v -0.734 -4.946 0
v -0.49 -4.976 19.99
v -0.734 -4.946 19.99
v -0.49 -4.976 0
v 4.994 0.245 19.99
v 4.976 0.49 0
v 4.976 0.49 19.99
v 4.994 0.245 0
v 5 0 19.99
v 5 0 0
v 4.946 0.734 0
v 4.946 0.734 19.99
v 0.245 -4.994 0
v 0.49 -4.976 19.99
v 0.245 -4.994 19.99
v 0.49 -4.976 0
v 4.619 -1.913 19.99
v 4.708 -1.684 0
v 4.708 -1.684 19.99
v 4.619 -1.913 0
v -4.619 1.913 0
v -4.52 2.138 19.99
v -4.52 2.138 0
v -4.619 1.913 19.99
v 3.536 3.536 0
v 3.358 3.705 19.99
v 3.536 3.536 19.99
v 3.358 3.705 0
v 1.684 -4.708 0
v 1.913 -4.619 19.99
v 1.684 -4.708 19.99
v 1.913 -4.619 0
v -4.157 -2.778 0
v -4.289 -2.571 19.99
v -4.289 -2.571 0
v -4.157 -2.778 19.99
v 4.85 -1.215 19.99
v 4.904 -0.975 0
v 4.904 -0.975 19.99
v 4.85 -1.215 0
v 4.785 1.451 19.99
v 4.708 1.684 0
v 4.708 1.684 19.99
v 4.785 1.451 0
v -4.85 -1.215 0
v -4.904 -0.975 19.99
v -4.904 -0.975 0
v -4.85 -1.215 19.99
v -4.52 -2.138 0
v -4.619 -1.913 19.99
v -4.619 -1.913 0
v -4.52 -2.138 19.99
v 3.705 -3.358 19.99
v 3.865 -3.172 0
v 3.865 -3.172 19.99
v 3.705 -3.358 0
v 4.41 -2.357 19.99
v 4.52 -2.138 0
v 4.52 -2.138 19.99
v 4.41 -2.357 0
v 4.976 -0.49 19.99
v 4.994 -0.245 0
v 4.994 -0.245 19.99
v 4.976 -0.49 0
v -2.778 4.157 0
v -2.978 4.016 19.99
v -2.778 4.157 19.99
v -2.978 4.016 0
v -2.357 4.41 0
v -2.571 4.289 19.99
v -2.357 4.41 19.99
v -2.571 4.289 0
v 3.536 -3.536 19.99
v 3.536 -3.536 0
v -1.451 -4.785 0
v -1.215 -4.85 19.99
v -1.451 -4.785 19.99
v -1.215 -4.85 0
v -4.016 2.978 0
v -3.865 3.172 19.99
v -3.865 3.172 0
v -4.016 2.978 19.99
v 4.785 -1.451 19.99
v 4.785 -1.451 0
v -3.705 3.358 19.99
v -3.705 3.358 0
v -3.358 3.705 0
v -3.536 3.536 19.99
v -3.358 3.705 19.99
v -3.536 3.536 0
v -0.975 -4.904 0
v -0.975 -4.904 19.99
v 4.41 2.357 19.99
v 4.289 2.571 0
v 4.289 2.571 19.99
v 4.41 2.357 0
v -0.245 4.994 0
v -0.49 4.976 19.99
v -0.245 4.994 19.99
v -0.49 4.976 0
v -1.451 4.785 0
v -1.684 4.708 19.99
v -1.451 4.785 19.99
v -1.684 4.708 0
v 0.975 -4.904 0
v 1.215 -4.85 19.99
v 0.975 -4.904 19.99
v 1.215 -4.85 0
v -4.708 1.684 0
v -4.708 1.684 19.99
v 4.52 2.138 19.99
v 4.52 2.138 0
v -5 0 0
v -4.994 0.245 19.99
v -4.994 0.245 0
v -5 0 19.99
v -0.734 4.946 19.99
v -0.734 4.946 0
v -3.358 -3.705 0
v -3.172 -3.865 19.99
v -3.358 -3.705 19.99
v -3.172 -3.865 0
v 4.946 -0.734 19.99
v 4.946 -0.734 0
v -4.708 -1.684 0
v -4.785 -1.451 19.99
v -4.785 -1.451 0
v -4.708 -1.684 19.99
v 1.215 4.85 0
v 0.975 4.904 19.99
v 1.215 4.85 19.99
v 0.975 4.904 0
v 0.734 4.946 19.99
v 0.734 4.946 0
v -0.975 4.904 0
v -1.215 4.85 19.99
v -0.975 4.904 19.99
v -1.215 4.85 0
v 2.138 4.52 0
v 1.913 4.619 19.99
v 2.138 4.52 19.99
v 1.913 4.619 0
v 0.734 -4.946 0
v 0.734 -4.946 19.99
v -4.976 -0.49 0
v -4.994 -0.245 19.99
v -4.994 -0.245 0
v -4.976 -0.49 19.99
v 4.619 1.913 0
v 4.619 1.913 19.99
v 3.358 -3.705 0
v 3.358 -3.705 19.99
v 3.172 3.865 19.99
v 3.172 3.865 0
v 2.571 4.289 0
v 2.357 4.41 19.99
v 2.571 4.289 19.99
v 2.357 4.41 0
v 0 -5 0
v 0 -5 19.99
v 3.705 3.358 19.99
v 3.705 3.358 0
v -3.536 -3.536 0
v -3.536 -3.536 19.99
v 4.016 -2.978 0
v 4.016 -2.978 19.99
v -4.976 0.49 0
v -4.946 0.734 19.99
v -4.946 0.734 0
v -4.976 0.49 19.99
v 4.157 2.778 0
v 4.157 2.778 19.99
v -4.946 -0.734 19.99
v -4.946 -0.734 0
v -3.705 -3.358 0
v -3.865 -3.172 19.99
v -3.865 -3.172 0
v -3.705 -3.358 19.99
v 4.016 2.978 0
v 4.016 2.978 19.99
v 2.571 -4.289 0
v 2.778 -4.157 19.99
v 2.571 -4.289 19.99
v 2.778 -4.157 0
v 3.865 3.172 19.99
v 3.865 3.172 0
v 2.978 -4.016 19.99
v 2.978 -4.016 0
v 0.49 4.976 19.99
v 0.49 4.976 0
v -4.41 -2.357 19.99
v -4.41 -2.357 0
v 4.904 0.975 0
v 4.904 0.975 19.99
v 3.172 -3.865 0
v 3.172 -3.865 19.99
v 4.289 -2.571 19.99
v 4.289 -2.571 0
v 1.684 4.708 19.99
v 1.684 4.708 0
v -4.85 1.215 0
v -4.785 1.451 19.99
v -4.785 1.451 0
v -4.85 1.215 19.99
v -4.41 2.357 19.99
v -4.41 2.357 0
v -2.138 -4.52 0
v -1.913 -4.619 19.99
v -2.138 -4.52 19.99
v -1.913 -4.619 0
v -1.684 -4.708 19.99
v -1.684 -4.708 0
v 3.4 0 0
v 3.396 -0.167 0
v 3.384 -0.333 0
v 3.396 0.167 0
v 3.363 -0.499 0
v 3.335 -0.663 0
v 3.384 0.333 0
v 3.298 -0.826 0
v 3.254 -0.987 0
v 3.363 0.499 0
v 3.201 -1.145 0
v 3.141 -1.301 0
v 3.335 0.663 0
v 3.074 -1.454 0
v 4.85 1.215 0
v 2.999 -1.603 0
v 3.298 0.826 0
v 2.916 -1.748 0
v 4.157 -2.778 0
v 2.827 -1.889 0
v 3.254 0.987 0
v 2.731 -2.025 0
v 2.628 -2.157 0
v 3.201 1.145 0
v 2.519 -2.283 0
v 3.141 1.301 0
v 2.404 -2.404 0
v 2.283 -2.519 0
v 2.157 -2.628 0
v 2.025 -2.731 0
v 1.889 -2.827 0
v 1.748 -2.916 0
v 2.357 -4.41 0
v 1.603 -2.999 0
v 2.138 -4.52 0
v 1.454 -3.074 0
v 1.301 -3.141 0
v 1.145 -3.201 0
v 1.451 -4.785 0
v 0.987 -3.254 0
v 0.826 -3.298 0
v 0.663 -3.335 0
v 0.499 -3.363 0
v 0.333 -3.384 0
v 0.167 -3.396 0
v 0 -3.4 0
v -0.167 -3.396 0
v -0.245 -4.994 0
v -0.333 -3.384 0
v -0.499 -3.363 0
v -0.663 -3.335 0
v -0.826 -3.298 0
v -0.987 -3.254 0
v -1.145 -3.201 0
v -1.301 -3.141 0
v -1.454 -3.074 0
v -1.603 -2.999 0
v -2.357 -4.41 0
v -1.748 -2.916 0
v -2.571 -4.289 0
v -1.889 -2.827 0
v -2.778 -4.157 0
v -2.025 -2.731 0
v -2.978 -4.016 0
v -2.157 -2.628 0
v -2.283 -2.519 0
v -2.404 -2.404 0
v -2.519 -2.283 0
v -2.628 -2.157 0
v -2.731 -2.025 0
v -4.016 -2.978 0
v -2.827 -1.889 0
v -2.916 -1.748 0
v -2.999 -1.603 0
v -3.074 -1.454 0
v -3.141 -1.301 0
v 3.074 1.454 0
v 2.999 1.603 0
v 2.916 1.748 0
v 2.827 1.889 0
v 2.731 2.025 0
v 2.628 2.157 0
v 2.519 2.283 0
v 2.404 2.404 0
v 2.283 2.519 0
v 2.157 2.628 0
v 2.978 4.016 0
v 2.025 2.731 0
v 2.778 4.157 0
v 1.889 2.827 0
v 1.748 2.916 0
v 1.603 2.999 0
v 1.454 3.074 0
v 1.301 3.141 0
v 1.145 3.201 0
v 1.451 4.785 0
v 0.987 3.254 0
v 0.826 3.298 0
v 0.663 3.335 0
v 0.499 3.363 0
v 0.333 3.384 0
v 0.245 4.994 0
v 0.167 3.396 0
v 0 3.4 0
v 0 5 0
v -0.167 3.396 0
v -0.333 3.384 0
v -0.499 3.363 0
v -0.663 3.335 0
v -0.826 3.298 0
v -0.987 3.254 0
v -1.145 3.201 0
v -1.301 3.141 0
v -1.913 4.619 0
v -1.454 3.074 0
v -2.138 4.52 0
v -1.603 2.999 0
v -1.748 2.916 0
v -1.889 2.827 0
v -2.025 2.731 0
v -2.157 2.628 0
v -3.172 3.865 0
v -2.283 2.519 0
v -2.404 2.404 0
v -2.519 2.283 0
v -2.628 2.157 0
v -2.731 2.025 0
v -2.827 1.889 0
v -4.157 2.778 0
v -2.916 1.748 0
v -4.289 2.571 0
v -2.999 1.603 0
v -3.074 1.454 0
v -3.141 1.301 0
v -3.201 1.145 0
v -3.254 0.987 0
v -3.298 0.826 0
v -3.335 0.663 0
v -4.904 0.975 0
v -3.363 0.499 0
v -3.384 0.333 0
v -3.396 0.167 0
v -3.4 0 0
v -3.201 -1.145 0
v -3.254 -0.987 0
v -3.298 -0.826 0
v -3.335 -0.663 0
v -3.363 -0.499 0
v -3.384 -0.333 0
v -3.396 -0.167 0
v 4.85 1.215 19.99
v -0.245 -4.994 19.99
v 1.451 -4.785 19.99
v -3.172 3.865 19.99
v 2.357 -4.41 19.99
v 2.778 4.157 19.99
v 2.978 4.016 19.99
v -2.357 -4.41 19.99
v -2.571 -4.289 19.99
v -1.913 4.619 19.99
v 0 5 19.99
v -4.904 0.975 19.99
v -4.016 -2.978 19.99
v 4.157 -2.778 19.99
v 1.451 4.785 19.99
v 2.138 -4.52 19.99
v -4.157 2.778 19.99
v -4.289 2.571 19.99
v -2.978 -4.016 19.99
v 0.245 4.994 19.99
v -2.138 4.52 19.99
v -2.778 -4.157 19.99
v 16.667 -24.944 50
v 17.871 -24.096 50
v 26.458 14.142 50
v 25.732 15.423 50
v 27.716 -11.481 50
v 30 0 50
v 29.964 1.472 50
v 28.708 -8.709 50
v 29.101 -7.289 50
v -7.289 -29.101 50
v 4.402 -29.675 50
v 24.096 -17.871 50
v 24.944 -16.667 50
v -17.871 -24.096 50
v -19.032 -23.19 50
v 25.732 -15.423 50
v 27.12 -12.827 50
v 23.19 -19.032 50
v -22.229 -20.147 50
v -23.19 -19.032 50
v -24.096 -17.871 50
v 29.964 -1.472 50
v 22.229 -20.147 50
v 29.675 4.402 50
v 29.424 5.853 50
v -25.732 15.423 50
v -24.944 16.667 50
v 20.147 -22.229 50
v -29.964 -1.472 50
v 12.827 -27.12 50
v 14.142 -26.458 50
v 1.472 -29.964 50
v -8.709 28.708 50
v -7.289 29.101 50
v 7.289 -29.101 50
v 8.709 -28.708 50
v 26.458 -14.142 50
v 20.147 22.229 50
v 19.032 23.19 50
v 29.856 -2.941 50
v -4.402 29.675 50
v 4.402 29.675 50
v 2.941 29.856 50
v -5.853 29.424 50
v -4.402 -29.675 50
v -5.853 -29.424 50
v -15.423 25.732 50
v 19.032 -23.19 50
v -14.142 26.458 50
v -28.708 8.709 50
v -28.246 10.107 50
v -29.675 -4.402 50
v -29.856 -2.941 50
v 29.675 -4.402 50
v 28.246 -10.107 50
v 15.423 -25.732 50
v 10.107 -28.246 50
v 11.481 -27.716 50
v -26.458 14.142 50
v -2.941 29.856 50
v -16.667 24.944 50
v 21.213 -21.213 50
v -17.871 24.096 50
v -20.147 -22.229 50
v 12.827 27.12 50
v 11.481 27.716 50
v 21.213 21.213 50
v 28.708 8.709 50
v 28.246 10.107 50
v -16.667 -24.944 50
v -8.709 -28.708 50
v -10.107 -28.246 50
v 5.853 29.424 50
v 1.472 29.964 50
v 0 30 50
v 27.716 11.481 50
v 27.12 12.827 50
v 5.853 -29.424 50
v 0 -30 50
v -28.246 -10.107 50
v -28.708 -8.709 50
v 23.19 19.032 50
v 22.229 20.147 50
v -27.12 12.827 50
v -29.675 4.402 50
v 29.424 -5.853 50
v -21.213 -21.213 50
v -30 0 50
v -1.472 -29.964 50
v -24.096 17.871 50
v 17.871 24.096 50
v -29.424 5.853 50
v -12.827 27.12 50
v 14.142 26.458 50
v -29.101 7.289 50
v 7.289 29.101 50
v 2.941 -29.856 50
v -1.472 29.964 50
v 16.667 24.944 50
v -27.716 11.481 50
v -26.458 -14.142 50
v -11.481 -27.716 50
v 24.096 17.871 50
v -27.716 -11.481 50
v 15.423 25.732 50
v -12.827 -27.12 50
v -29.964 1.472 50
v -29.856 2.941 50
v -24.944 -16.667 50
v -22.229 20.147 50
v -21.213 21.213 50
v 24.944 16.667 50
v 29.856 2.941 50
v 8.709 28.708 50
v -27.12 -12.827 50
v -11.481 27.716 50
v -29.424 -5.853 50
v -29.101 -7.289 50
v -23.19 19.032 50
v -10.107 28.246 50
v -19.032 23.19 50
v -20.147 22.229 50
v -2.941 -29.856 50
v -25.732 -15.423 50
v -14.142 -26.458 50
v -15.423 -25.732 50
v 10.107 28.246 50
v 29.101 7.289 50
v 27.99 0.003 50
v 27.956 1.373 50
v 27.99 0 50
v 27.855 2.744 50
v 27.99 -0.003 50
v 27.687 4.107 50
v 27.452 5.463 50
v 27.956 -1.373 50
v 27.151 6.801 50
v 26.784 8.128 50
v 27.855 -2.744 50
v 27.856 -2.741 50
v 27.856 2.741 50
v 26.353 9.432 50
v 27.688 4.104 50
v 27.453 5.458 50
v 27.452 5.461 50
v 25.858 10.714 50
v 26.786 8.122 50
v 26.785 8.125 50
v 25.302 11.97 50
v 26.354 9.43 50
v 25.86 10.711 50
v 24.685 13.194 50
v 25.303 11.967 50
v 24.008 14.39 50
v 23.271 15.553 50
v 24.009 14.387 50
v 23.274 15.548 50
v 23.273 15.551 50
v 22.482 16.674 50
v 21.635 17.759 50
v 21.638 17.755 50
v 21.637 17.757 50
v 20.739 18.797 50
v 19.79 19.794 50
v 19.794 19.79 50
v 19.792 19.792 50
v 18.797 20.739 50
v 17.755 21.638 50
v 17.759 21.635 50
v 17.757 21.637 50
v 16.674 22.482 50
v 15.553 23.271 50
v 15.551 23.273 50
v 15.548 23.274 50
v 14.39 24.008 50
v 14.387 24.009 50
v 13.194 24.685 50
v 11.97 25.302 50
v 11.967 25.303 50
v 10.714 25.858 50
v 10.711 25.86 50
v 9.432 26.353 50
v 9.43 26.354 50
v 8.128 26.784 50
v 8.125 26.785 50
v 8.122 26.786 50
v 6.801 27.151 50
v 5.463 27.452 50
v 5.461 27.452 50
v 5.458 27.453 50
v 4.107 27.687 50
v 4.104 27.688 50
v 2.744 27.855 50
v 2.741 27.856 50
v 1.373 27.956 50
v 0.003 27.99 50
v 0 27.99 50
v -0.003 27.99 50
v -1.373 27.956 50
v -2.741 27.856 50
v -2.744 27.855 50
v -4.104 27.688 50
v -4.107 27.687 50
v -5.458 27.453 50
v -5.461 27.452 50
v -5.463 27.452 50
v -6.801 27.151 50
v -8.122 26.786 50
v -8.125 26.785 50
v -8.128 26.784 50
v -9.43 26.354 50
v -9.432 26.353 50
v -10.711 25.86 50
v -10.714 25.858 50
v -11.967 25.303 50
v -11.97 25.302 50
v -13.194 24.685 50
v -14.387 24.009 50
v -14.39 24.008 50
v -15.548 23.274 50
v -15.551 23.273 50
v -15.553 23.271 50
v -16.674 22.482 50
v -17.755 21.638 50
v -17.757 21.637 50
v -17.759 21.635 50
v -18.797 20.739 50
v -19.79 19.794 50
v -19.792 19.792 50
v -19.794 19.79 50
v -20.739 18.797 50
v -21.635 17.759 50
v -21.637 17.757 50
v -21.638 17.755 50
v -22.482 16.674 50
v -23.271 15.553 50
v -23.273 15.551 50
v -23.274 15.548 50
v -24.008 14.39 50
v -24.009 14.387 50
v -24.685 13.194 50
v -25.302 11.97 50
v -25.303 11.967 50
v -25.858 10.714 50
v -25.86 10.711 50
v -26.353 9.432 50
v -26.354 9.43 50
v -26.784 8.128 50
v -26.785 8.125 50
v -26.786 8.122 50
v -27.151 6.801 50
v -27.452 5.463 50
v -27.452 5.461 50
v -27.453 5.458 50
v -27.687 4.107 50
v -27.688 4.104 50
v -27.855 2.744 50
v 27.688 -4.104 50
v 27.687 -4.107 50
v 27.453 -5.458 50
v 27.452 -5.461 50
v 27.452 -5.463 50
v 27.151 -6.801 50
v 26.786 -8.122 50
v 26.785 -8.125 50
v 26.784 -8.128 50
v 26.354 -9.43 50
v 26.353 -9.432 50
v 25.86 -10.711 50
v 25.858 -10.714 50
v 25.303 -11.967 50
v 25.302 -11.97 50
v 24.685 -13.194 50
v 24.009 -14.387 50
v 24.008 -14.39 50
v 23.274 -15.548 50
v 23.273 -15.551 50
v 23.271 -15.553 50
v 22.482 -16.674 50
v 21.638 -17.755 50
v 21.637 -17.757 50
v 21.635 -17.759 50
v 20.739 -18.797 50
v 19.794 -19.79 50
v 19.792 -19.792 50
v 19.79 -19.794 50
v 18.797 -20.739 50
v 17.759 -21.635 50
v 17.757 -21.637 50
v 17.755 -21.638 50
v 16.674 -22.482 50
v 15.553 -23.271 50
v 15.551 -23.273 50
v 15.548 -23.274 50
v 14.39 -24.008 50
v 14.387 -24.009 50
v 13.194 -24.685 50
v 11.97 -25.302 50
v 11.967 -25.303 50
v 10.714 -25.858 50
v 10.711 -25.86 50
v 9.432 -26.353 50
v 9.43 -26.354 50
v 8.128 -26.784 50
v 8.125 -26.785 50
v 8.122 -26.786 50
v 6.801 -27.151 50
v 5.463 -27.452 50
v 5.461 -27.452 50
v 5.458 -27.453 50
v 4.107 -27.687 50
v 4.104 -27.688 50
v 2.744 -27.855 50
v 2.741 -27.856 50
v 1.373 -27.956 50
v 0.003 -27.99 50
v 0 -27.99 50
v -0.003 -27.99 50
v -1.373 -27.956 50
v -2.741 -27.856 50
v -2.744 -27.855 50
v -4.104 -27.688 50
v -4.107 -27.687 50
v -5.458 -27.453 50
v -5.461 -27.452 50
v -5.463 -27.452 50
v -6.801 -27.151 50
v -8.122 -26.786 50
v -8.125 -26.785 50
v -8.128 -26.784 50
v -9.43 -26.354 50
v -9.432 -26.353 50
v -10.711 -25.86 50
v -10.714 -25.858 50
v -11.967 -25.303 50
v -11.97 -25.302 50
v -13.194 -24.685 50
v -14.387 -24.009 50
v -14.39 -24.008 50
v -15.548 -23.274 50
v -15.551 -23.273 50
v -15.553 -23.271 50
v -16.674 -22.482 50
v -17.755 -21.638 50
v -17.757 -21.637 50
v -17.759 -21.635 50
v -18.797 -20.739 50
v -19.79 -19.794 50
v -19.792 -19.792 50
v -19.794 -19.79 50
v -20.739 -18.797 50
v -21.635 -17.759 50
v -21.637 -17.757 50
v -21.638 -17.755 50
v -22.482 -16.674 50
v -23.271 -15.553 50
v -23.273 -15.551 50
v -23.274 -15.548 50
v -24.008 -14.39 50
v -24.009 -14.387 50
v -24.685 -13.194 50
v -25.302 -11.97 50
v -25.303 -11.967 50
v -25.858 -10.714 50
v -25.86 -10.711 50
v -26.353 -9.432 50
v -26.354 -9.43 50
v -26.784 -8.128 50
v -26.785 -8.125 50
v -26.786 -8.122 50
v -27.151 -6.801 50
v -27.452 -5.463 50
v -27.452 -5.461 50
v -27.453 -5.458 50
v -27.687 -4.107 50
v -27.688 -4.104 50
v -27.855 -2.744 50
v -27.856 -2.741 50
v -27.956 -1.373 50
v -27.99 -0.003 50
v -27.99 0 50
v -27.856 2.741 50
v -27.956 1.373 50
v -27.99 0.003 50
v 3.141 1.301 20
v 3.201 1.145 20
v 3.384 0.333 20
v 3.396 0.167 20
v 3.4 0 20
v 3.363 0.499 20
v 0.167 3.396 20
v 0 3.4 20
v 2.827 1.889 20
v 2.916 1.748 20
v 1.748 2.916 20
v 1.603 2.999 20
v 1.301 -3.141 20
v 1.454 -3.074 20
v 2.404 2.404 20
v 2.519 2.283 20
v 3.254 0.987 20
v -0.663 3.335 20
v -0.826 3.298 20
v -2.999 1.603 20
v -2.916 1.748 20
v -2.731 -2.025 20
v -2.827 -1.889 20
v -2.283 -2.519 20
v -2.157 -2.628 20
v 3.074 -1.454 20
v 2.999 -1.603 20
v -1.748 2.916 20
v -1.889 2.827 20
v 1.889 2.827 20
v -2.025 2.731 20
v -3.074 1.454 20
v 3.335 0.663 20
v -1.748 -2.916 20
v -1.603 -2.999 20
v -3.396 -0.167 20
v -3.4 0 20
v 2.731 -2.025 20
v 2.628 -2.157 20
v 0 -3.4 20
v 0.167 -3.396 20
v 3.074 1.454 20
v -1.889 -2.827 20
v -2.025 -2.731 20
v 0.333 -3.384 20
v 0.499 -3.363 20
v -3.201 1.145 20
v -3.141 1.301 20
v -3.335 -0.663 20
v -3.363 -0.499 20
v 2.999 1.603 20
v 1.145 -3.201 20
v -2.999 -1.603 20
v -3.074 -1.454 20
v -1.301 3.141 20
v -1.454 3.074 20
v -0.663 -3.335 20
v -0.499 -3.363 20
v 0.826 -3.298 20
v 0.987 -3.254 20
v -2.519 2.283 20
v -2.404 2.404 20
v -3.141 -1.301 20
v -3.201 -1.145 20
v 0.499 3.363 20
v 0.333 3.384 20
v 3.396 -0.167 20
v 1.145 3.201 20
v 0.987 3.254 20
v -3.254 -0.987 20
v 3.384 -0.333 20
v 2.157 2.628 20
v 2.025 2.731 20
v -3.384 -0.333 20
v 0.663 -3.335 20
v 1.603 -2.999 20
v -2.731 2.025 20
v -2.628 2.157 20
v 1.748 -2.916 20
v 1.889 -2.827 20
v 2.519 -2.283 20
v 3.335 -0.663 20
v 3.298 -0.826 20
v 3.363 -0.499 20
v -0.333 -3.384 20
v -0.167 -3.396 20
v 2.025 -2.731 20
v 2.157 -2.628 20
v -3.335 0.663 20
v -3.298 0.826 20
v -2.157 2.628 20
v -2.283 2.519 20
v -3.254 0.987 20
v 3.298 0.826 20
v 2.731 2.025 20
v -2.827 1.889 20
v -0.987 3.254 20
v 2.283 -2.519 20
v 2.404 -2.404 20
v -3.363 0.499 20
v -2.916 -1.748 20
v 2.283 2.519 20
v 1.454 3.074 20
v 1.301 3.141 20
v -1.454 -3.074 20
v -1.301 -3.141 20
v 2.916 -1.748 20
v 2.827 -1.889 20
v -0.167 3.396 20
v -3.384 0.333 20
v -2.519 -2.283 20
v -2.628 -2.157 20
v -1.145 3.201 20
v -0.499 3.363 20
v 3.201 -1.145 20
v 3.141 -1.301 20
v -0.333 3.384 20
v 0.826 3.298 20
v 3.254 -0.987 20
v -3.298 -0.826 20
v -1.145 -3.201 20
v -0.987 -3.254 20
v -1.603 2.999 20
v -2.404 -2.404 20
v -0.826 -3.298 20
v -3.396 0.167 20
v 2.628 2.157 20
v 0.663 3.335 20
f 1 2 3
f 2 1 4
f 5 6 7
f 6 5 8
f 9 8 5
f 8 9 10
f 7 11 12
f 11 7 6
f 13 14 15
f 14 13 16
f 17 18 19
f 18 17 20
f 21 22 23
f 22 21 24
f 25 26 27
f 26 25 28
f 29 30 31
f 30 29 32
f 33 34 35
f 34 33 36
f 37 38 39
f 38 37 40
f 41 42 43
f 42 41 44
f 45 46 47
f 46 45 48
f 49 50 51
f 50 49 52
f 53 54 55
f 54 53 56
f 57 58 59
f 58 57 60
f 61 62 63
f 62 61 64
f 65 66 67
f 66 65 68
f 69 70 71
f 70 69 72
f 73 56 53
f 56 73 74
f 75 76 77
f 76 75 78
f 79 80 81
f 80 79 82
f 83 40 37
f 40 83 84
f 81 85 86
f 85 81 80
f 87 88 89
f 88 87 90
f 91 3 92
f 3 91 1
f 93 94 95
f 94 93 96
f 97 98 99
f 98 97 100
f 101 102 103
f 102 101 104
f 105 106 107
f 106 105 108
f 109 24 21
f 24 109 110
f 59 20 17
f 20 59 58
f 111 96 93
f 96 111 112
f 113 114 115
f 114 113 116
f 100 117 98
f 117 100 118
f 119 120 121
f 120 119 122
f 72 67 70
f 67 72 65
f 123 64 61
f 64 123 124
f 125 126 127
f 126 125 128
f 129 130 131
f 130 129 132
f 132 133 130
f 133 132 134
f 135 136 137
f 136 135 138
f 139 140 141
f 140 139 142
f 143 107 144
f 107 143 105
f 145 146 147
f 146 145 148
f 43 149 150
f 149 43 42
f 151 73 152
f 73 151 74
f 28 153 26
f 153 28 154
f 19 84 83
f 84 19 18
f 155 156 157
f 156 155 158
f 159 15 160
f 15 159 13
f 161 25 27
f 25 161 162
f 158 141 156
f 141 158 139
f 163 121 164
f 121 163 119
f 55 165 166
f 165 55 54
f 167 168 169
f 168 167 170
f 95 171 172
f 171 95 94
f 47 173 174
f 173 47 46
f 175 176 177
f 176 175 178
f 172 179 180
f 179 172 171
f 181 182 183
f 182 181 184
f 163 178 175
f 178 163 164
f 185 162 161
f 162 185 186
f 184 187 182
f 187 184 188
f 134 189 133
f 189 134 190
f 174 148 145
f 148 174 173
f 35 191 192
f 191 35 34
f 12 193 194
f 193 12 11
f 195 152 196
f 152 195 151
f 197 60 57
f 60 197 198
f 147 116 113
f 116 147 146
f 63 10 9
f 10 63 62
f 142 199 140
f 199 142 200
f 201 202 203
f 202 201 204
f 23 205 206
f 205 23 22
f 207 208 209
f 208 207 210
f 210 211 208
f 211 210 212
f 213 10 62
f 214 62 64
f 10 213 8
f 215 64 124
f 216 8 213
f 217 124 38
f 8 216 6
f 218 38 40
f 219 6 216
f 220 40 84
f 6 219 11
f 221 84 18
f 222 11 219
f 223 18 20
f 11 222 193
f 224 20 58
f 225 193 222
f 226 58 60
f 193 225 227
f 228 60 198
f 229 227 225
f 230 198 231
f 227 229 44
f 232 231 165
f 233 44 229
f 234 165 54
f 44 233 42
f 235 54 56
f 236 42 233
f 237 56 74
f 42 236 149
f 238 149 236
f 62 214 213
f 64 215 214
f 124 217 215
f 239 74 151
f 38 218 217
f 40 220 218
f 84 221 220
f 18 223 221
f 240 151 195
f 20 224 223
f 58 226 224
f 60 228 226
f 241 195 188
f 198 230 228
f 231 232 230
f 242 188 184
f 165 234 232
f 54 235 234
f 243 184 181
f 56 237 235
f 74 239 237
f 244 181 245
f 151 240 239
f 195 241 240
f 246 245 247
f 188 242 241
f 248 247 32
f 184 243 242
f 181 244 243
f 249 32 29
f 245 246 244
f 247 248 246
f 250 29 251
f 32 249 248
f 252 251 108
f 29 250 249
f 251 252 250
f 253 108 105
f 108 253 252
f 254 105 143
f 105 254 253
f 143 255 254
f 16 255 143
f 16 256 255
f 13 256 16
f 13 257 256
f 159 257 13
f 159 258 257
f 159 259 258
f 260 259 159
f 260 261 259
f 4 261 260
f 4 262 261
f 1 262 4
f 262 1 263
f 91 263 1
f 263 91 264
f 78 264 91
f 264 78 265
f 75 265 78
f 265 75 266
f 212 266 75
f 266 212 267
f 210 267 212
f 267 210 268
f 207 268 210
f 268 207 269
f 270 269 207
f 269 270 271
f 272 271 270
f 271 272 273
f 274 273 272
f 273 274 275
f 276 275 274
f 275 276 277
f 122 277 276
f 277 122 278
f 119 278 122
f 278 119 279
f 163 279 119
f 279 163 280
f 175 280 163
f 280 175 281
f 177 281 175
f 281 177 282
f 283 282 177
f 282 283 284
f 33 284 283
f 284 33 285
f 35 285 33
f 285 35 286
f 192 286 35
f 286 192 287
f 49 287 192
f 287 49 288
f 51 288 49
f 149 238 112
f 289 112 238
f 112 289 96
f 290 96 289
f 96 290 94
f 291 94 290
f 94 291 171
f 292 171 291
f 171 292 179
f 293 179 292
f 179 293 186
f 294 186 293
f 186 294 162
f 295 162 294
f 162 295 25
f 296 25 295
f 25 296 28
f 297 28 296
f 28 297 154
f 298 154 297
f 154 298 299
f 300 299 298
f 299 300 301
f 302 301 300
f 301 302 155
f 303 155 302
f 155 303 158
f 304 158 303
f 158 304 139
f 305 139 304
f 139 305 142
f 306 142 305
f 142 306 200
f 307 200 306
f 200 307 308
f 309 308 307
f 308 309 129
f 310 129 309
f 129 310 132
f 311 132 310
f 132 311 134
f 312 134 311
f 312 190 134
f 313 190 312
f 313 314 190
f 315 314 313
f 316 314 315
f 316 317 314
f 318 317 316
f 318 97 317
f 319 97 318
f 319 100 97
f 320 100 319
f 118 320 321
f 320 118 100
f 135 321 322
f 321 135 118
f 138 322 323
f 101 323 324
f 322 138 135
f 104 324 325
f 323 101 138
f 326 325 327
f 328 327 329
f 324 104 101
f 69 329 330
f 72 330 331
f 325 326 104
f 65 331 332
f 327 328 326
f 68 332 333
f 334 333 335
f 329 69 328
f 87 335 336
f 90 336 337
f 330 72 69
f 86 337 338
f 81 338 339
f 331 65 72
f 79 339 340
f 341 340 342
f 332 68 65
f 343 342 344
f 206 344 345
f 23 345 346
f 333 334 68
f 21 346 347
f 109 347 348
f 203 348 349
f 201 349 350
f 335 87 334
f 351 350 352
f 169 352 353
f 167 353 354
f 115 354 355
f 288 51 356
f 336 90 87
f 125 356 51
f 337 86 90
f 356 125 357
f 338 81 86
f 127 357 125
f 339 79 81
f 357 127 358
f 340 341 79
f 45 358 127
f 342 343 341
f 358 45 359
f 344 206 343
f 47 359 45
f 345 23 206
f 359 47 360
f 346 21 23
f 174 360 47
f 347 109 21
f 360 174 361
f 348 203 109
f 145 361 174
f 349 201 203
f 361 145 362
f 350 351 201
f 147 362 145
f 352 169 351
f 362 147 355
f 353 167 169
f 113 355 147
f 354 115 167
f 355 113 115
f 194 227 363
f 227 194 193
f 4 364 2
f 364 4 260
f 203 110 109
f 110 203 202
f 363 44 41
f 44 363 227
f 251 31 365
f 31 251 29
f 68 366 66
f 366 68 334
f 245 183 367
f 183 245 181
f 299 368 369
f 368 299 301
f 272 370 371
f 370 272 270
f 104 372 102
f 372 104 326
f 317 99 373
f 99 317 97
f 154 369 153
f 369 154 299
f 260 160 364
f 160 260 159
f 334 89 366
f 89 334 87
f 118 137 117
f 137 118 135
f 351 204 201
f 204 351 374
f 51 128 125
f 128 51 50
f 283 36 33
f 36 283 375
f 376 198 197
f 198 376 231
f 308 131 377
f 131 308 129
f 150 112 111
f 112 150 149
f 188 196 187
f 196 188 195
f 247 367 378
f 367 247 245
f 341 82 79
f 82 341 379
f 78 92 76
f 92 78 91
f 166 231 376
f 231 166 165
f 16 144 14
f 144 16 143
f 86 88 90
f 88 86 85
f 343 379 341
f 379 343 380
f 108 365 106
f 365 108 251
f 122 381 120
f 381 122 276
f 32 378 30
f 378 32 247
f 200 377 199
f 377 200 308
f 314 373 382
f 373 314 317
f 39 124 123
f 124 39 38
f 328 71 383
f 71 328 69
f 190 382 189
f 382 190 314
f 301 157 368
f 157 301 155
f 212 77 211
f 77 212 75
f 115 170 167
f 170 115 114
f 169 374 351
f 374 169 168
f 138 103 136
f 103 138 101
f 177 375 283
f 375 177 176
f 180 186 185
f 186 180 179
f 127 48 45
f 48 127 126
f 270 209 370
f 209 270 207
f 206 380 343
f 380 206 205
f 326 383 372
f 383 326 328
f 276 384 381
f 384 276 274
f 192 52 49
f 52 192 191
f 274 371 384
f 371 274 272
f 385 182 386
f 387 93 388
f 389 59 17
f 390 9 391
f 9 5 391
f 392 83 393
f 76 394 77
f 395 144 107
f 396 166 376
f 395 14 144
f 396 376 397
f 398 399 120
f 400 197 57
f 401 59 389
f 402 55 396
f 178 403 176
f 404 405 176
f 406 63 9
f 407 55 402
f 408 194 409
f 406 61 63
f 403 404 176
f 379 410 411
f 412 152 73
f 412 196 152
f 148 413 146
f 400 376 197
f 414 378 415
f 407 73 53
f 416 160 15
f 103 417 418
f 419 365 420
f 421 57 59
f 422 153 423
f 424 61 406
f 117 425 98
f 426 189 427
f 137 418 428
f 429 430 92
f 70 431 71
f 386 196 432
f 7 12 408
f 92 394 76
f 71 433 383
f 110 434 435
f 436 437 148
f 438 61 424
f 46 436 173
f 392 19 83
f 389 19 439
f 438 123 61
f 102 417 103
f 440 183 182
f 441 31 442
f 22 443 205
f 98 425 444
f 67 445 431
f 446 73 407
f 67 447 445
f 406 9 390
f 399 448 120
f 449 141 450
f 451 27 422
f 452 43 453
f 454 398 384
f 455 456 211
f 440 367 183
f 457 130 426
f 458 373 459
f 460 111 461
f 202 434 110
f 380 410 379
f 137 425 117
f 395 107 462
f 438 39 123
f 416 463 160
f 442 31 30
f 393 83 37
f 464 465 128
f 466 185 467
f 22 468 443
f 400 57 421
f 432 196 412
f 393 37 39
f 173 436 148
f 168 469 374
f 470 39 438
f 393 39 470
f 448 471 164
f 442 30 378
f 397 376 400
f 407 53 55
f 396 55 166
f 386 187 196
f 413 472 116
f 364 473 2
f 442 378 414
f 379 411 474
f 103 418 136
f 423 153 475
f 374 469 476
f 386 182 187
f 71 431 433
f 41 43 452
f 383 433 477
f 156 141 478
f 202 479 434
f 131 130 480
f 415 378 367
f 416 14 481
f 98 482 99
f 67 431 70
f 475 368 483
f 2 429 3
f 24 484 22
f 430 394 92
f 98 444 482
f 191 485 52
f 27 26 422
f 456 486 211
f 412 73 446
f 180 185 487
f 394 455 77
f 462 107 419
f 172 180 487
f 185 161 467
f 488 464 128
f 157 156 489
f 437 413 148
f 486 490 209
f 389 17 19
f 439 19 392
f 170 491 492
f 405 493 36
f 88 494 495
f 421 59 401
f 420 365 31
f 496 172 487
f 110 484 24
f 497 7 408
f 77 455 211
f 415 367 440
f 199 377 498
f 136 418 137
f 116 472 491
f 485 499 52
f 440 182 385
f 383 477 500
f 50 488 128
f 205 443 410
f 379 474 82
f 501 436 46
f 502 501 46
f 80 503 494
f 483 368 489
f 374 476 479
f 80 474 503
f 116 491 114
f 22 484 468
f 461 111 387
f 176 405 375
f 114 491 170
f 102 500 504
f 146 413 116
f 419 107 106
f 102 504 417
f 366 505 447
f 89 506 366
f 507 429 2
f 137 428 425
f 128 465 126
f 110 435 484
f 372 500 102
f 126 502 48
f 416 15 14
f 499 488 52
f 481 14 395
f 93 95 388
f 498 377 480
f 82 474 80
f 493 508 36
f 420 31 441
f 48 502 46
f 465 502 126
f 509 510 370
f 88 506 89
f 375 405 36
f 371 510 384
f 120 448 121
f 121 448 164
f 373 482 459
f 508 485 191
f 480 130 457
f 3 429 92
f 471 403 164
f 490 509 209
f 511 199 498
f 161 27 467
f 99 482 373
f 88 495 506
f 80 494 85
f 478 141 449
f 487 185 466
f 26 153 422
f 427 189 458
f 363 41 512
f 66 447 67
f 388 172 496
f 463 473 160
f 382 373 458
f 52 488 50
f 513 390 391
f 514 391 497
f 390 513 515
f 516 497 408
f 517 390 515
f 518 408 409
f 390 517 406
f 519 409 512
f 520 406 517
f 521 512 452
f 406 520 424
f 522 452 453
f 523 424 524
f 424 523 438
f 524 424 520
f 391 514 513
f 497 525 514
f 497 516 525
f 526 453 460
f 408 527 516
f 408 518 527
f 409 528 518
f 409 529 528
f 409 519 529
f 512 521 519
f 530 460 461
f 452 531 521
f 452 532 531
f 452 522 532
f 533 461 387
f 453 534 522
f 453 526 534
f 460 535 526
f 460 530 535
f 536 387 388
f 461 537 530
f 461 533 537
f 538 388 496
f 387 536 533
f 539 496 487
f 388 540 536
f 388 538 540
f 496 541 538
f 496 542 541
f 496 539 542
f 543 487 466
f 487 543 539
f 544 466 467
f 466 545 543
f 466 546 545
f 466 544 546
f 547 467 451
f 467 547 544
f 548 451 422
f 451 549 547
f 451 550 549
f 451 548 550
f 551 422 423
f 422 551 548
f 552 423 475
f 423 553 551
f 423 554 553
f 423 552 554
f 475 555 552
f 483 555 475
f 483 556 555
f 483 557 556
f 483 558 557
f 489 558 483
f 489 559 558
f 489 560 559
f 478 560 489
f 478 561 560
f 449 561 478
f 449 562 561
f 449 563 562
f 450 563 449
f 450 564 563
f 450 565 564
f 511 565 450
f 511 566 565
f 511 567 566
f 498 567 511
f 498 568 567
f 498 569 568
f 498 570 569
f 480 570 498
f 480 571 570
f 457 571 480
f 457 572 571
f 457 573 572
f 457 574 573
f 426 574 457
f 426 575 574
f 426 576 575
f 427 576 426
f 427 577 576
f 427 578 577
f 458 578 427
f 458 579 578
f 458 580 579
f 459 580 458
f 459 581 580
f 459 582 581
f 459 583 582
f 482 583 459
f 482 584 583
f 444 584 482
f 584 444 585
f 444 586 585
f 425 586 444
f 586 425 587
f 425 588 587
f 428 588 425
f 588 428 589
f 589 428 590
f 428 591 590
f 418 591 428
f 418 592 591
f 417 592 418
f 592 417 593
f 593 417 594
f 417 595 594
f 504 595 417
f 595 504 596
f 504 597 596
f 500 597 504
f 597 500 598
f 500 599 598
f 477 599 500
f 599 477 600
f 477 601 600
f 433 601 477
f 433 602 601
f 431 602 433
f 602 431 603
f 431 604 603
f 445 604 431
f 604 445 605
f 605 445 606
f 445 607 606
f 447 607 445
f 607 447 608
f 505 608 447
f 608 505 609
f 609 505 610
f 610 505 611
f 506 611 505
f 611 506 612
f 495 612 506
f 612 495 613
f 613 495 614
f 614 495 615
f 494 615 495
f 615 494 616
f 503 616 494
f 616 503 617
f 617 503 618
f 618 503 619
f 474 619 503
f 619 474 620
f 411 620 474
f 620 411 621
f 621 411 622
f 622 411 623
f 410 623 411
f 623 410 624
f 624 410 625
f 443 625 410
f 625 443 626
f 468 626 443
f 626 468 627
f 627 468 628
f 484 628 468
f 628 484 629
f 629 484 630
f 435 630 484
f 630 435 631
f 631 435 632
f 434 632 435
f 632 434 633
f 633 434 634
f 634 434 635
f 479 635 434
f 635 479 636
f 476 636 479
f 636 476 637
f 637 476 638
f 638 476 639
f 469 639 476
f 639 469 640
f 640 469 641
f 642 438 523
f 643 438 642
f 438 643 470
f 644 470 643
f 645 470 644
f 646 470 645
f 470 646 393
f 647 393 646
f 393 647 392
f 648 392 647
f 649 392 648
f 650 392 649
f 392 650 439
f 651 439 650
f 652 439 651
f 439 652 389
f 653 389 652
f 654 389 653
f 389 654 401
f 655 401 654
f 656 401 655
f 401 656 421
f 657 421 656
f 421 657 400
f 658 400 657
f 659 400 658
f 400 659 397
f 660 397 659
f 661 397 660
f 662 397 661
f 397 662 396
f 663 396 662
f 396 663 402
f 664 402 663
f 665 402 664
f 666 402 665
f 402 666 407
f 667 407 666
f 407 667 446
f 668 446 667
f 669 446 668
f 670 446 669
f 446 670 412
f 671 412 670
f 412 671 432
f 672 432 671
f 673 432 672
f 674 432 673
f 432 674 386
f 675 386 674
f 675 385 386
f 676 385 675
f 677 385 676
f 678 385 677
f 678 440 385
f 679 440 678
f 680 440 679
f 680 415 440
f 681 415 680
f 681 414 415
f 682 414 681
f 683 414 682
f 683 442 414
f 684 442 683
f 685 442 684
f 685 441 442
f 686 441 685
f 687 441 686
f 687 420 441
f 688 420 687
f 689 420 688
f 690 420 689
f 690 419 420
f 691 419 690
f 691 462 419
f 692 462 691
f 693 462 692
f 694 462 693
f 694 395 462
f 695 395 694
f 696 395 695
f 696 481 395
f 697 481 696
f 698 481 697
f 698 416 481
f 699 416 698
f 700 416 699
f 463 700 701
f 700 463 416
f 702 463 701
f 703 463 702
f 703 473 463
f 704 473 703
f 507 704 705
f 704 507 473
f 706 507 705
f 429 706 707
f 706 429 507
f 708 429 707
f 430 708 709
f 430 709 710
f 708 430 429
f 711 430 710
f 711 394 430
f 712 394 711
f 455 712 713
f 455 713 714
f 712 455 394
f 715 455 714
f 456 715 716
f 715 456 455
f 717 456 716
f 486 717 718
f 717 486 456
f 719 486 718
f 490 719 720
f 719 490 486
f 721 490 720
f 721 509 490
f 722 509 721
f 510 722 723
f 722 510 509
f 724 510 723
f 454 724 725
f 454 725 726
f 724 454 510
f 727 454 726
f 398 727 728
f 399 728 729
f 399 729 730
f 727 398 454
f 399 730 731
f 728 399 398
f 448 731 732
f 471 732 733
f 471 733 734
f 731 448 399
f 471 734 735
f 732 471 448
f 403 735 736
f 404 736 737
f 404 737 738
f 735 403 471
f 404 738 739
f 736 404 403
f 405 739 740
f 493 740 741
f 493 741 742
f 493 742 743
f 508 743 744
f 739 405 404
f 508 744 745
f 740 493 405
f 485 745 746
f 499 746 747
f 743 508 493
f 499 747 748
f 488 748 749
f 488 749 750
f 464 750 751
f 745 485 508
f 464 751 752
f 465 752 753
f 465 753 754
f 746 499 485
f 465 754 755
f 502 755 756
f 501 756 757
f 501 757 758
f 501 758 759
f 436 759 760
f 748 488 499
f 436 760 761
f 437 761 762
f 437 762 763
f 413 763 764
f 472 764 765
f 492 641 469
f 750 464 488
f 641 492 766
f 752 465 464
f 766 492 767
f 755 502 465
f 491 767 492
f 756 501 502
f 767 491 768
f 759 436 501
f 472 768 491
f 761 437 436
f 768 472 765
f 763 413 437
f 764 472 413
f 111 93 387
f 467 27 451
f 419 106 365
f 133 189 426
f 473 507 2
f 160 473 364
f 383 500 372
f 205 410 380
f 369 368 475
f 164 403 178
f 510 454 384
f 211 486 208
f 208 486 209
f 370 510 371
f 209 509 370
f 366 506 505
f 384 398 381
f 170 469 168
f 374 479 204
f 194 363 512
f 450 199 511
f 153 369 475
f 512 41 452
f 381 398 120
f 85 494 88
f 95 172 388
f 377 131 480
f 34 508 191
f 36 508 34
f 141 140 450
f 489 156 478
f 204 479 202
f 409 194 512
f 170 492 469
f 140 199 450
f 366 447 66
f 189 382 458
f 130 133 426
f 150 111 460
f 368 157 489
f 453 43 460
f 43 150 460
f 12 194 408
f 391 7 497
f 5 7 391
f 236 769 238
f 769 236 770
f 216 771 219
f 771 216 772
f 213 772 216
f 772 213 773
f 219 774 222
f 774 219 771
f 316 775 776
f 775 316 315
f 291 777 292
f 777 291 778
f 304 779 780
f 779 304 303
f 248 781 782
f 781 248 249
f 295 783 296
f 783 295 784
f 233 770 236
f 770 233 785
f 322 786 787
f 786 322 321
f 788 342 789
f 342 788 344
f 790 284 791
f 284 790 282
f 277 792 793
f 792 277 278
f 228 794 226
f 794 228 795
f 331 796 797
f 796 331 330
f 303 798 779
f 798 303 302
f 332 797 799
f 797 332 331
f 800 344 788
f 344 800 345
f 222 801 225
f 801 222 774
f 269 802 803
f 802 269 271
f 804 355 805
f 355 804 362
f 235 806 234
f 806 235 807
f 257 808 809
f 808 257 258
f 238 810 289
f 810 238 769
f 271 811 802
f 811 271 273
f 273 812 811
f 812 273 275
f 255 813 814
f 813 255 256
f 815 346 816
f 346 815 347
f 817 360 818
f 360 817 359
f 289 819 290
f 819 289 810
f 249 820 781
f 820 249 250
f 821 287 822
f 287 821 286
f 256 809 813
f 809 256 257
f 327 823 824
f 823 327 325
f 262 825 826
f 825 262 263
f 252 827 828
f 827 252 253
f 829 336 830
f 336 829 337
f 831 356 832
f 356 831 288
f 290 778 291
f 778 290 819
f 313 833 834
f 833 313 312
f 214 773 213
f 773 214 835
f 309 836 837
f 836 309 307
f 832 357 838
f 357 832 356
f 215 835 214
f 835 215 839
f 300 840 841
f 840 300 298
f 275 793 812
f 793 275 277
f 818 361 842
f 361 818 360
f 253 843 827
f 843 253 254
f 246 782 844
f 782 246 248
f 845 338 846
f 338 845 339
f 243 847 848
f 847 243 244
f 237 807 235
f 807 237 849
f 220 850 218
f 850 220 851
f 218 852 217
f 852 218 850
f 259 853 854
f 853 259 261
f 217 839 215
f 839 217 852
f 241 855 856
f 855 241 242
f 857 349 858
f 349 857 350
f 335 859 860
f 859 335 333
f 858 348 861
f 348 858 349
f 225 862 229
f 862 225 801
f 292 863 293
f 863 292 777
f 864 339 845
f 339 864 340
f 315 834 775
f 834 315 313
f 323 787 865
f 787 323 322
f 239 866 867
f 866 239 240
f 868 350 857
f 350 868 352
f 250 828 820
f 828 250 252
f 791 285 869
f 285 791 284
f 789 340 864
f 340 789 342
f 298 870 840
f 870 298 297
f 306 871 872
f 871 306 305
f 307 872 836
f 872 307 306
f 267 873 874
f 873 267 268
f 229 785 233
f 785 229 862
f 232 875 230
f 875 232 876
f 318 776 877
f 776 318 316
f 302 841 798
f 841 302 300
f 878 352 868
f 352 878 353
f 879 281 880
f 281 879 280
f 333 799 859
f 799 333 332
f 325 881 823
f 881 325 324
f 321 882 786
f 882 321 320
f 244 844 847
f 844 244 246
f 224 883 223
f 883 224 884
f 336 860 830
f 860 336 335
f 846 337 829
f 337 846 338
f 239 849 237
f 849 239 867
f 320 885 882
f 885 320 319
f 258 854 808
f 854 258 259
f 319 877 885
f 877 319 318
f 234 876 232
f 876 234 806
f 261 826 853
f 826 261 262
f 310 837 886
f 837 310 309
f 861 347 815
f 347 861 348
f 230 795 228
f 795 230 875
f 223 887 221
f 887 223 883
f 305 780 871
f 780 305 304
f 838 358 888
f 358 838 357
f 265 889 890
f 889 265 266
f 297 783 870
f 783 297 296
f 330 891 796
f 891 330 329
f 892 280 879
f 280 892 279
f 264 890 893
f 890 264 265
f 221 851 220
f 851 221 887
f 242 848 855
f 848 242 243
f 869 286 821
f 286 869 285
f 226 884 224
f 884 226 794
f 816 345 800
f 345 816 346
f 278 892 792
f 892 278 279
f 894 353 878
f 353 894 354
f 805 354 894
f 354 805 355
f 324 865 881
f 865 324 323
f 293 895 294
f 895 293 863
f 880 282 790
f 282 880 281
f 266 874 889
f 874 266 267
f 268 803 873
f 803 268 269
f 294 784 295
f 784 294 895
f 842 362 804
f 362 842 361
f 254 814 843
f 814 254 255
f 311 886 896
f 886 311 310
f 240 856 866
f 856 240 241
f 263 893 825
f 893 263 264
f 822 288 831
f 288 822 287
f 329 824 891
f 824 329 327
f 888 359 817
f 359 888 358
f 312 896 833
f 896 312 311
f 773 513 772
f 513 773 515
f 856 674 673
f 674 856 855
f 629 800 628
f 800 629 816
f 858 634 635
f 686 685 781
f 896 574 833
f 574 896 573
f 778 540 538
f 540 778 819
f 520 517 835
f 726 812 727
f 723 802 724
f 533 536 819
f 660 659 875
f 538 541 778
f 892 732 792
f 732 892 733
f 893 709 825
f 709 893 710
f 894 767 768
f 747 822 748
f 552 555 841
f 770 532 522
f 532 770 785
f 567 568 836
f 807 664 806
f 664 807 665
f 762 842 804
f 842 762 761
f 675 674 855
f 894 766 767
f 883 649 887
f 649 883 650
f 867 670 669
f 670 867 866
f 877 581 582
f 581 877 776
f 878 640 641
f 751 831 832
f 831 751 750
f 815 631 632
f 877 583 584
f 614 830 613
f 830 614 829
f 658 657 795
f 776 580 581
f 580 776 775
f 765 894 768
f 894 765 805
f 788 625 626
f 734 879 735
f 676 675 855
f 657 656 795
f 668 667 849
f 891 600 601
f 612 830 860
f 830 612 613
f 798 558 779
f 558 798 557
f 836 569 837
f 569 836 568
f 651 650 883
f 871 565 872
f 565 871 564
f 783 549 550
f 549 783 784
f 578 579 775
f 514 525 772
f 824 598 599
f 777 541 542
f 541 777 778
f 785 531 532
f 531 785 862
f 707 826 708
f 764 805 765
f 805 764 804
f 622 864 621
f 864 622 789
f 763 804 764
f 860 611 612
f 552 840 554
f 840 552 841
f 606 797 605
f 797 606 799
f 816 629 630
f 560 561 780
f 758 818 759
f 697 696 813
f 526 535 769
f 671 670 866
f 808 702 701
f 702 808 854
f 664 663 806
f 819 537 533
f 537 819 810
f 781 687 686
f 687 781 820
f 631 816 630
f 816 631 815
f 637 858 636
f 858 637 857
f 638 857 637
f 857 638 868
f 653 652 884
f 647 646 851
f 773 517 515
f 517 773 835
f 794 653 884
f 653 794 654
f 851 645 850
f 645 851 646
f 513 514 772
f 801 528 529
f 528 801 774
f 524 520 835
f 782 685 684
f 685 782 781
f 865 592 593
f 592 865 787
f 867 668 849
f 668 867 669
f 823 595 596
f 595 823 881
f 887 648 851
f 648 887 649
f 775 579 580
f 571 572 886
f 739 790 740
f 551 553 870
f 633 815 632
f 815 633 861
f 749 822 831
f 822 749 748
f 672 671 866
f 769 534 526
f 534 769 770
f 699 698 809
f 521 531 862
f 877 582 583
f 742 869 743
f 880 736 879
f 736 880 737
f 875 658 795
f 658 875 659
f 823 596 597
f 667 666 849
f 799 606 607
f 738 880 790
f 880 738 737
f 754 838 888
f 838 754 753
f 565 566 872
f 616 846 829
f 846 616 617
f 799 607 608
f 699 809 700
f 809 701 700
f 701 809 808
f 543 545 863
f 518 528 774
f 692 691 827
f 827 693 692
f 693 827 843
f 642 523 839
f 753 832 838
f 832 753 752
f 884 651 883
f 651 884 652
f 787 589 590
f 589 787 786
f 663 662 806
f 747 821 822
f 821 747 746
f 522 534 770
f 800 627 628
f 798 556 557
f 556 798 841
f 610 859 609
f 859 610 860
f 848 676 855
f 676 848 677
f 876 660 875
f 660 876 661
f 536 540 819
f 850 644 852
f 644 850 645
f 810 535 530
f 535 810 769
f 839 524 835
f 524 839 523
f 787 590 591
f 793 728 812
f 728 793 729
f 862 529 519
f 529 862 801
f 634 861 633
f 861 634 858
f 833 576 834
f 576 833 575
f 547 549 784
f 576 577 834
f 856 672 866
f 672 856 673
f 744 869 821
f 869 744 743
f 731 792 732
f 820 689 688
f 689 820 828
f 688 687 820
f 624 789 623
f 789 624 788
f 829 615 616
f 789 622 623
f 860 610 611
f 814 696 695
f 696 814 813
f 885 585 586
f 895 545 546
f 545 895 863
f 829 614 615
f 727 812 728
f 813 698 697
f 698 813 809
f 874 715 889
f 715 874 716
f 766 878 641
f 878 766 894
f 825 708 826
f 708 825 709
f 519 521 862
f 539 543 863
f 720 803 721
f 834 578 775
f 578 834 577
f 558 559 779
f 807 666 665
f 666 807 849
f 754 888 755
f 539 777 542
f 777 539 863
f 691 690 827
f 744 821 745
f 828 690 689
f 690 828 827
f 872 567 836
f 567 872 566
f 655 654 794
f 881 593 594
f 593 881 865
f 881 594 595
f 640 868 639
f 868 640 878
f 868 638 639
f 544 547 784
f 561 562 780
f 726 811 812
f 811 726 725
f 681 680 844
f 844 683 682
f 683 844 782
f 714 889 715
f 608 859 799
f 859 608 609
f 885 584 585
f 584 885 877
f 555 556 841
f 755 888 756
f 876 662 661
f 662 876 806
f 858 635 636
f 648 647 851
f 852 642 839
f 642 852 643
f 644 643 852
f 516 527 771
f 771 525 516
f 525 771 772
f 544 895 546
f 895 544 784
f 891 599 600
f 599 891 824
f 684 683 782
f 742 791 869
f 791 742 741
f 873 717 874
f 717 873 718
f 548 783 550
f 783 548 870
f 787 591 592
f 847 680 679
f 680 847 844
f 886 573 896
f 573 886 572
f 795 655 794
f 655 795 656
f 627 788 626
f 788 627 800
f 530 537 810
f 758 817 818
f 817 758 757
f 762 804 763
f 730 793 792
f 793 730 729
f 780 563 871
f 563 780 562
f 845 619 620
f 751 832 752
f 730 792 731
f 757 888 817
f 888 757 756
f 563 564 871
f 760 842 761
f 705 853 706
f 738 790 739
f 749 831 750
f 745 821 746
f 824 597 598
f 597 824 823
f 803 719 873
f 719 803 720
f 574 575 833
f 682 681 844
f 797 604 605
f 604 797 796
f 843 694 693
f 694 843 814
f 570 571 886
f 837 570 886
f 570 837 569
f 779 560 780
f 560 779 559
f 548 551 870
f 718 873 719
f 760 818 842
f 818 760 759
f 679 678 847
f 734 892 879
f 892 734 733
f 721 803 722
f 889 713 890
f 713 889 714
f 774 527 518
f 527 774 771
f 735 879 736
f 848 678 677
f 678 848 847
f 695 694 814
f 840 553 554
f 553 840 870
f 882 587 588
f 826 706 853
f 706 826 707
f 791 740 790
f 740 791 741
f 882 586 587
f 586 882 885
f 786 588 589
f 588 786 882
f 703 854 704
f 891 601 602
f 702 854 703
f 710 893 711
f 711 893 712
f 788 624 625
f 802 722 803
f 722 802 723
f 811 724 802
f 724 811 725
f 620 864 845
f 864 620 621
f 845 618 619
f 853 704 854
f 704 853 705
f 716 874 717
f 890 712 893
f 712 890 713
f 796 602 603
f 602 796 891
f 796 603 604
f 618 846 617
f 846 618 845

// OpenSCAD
// Lab funnel - printed upright, wide opening at the top
// Units: mm

// ---- Parameters ----
spout_od      = 10;    // spout outer diameter
spout_h       = 20;    // spout height (z = 0 to 20)
cone_od_top   = 60;    // cone outer diameter at rim
cone_h        = 30;    // cone height (z = 20 to 50)
wall          = 1.6;   // wall thickness everywhere
eps           = 0.5;   // cutter overshoot past faces

$fn = 128;

// ---- Derived ----
spout_id = spout_od - 2 * wall;   // 6.8 mm bore
cone_od_bottom = spout_od;       // cone starts at spout diameter

// ---- Model ----
difference() {
    union() {
        // Spout tube
        cylinder(d = spout_od, h = spout_h);
        // Cone on top (smoothly joined at shared diameter)
        translate([0, 0, spout_h - 0.01])
            cylinder(d1 = cone_od_bottom, d2 = cone_od_top, h = cone_h + 0.01);
    }
    // Bottom cut - open bottom at z = 0
    translate([0, 0, -eps])
        cylinder(d = spout_id, h = spout_h + 2 * eps);
    // Cone cavity - open top at z = 50
    translate([0, 0, spout_h])
        cylinder(d1 = cone_od_bottom - 2 * wall,
                 d2 = cone_od_top - 2 * wall,
                 h = cone_h + eps);
}
